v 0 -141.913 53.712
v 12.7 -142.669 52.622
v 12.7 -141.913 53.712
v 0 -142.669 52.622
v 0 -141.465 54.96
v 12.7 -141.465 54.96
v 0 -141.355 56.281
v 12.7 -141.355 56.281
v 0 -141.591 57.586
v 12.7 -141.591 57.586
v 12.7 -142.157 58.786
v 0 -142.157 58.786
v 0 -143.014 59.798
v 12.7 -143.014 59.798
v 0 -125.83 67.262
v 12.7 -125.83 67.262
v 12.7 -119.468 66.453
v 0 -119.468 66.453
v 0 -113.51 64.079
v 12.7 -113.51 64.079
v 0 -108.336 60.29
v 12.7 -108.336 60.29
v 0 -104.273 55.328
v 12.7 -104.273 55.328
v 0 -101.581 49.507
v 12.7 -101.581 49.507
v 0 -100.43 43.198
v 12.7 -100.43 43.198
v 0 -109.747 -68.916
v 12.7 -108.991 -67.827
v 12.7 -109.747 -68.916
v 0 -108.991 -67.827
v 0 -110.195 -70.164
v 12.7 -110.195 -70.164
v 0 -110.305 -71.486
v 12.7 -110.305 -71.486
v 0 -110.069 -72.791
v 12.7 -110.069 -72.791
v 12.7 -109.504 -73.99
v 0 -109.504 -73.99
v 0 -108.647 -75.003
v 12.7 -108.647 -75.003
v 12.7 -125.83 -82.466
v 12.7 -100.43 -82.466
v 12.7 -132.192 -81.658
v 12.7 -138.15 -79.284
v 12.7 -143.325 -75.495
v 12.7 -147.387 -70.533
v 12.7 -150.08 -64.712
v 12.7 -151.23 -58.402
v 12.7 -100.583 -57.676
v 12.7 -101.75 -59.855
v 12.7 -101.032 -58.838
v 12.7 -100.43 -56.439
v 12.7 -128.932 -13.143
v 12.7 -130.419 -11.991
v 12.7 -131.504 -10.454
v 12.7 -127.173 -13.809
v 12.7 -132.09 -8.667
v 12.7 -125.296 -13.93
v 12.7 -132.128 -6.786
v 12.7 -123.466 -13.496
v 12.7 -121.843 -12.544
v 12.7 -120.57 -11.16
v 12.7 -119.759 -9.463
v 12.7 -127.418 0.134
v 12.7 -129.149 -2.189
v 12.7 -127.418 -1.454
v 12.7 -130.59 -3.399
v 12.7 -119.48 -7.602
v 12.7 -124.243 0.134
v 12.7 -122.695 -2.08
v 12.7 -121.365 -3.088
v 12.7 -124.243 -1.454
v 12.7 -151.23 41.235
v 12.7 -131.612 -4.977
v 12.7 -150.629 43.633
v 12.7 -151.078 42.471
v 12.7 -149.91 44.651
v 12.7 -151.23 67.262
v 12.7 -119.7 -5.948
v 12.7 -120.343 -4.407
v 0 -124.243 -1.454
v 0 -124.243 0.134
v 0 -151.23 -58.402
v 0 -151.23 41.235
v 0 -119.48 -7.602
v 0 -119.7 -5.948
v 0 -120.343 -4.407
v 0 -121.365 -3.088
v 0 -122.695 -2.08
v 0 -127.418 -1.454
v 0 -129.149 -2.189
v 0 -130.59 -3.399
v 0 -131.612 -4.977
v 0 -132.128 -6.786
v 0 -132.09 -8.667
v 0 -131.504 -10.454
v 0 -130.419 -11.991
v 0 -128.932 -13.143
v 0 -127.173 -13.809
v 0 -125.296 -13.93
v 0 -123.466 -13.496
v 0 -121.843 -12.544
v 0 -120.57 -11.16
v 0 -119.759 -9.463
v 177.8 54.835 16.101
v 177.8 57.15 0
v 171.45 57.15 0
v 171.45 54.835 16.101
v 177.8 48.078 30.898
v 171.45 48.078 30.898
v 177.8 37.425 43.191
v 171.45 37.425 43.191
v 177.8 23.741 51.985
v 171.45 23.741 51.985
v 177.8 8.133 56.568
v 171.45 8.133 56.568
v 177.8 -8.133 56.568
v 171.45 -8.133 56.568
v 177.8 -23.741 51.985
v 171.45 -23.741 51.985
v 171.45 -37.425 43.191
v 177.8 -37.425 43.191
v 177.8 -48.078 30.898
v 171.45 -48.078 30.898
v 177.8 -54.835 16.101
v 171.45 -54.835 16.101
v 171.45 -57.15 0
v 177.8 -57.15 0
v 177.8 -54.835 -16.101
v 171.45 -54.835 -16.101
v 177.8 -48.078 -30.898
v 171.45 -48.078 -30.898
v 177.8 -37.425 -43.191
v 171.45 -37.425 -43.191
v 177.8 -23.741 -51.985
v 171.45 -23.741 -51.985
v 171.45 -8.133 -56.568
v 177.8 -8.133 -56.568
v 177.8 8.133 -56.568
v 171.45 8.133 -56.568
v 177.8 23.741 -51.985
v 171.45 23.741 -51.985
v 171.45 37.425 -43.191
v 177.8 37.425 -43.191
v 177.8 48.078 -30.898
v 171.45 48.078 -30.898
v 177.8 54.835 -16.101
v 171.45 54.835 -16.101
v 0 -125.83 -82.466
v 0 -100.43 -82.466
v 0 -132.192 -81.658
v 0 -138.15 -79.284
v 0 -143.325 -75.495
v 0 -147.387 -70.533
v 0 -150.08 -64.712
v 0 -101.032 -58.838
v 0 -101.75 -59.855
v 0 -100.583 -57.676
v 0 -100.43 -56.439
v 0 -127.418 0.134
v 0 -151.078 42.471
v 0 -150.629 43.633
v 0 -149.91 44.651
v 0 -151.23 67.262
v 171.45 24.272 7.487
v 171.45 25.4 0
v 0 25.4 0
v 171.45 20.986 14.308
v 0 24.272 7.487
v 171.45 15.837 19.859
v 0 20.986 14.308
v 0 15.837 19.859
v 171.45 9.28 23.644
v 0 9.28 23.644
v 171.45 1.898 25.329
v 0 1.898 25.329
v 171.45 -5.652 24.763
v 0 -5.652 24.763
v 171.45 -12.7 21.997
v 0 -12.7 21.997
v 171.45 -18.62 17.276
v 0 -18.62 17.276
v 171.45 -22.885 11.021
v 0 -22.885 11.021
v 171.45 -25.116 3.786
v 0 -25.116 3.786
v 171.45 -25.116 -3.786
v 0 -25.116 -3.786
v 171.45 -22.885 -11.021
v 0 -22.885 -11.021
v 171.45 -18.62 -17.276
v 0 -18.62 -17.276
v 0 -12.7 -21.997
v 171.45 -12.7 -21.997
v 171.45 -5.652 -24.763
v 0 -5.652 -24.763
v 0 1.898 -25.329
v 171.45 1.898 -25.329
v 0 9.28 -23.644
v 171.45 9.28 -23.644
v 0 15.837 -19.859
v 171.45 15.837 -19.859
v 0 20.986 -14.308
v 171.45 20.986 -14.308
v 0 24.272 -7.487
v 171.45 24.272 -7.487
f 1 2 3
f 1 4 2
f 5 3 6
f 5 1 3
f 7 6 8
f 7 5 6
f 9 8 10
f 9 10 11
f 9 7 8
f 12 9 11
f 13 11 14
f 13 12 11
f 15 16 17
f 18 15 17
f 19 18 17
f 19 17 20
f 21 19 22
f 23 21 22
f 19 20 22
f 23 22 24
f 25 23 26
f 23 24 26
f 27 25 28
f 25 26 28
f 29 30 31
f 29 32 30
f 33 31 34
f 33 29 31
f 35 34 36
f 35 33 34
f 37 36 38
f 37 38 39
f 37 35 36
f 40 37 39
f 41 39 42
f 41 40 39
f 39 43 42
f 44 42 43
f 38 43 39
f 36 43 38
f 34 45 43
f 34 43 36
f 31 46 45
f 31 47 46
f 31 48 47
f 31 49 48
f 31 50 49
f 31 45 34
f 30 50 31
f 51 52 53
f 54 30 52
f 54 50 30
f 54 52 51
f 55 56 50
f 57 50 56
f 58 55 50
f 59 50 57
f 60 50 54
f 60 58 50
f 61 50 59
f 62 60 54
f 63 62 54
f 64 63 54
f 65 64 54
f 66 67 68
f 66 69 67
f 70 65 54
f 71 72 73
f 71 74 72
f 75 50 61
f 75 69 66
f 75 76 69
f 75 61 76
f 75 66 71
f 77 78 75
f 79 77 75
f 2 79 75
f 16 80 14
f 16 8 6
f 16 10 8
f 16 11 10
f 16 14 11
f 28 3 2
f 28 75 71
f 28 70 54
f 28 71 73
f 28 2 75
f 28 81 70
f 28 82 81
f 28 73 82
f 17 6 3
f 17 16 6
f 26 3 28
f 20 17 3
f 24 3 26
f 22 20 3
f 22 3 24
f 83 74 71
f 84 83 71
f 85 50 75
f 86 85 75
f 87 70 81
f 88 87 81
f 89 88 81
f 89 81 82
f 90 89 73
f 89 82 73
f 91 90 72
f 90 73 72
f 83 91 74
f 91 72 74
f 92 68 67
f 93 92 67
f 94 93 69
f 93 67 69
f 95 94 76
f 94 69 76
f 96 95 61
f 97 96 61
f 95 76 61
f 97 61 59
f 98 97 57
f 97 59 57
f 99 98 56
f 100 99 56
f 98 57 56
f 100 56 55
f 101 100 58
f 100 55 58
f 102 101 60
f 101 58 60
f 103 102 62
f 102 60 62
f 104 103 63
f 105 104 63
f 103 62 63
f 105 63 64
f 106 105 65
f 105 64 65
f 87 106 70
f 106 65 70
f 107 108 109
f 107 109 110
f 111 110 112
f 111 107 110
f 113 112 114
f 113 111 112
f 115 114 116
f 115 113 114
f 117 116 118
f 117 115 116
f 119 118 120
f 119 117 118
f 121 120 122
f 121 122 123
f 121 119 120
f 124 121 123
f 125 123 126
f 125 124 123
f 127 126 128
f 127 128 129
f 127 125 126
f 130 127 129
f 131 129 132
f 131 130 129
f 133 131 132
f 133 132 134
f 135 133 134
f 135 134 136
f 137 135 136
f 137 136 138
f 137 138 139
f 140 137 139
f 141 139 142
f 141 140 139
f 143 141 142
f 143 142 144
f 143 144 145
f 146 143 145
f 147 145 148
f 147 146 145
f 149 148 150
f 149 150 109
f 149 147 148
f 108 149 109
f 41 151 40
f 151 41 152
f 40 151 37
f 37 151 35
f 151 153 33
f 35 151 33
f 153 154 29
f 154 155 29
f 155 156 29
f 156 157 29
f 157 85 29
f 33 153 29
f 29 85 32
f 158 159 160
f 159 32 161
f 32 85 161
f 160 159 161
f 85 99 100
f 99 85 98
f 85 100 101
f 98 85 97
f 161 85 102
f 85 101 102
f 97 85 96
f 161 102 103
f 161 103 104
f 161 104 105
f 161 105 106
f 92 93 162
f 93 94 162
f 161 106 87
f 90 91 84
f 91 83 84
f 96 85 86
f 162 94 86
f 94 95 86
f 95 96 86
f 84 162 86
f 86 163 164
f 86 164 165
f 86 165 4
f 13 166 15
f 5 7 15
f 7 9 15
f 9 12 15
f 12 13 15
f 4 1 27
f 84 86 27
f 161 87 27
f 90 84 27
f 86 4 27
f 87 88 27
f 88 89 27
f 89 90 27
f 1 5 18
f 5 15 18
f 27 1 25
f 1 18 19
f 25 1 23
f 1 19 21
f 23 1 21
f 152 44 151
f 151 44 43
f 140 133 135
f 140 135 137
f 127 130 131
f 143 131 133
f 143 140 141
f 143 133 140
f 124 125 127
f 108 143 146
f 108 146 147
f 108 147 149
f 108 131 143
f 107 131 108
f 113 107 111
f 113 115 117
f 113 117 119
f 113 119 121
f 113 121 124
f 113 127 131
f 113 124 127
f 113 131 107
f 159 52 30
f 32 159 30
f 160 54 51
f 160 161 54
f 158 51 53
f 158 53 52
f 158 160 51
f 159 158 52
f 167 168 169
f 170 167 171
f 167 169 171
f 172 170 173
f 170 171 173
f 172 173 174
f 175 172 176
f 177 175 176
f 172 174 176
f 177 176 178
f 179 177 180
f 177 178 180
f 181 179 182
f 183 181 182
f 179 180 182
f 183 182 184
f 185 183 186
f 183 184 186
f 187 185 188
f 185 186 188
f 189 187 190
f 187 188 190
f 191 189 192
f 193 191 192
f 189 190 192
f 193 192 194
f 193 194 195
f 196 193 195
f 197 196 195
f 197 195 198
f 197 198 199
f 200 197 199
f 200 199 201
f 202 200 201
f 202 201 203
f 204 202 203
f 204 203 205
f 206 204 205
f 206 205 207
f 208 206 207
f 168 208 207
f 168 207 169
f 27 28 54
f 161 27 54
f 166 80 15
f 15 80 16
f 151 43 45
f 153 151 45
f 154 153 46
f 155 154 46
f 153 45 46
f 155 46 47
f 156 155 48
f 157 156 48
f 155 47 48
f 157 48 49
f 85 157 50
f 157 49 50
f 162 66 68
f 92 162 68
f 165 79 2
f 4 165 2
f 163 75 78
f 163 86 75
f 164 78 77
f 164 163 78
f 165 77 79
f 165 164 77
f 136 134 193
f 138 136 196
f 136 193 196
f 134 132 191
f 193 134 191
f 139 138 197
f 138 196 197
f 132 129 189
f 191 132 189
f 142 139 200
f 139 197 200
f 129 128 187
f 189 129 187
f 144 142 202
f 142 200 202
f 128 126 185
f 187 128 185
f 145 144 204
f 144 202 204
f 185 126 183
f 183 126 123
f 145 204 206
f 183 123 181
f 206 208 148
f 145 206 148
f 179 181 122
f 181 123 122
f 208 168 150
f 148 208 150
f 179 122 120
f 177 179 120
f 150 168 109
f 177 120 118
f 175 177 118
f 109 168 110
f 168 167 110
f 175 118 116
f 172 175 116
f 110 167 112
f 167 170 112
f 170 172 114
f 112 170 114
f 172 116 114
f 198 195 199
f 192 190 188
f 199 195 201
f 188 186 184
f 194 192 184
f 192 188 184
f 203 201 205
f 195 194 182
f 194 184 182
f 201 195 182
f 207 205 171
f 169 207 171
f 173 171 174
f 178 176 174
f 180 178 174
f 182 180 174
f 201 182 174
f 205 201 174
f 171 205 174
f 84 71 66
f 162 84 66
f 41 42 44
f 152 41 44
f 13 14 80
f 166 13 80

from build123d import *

# Parameters (mm, degrees)
F0_R      = 25.4
F1_DEPTH  = 177.8
F2_R      = 57.15
F2_R_2    = 25.4
F3_DEPTH  = 6.35
F4_R      = 101.6
F5_DEPTH  = 12.7
F7_DEPTH  = 12.7
F9_R      = 101.6
F10_DEPTH = 12.7
F11_R     = 5.08


with BuildPart() as f1:
    # F0 (on Right) → F1 (new body)
    with BuildSketch(Plane.YZ):
        Circle(F0_R)
    extrude(amount=F1_DEPTH)

    # F2 (on face) → F3 (join)
    with BuildSketch(Plane.YZ.offset(177.8)):
        Circle(F2_R)
        Circle(F2_R_2, mode=Mode.SUBTRACT)
    extrude(amount=-F3_DEPTH)


with BuildPart() as f5:
    # F4 (on Right) → F5 (new body)
    with BuildSketch(Plane.YZ):
        with Locations((-125.8302330971, -7.6023228467)):
            Circle(F4_R)
    extrude(amount=F5_DEPTH)

    # F6 (on face) → F7 (cut, through all)
    with BuildSketch(Plane.YZ.offset(12.7)):
        with BuildLine():
            ThreePointArc((-127.4177330971, -1.4539617845), (-129.7187980637, -12.6224386322), (-119.4802330971, -7.6023228467))
            ThreePointArc((-119.4802330971, -7.6023228467), (-120.8101173116, -3.71375788), (-124.2427330971, -1.4539617845))
            ThreePointArc((-124.2427330971, -1.4539617845), (-125.8302330971, -1.2523228467), (-127.4177330971, -1.4539617845))
        make_face()
        with BuildLine():
            ThreePointArc((-127.4177330971, -1.4539617845), (-125.8302330971, -1.2523228467), (-124.2427330971, -1.4539617845))
            Line((-124.2427330971, -1.4539617845), (-124.2427330971, 0.1335382155))
            Line((-124.2427330971, 0.1335382155), (-127.4177330971, 0.1335382155))
            Line((-127.4177330971, 0.1335382155), (-127.4177330971, -1.4539617845))
        make_face()
    extrude(amount=-F7_DEPTH, mode=Mode.SUBTRACT)

    # F9 (on face) → F10 (cut, through all)
    with BuildSketch(Plane.YZ.offset(12.7)):
        with Locations((-125.8302330971, -7.6023228467)):
            Circle(F9_R)
        with BuildLine():
            ThreePointArc((-125.8302330971, 67.2617186885), (-108.3356761221, 60.2904333334), (-100.4302330971, 43.1976771533))
            Line((-100.4302330971, 43.1976771533), (-100.4302330971, -7.6023228467))
            Line((-100.4302330971, -7.6023228467), (-100.4302330971, -58.4023228467))
            Line((-100.4302330971, -58.4023228467), (-112.406924367, -71.586901629))
            Line((-112.406924367, -71.586901629), (-100.4302330971, -82.4663643818))
            Line((-100.4302330971, -82.4663643818), (-125.8302330971, -82.4663643818))
            ThreePointArc((-125.8302330971, -82.4663643818), (-143.3247900721, -75.4950790267), (-151.2302330971, -58.4023228467))
            Line((-151.2302330971, -58.4023228467), (-151.2302330971, -7.6023227028))
            Line((-151.2302330971, -7.6023227028), (-151.2302330971, 43.1976771533))
            Line((-151.2302330971, 43.1976771533), (-139.2535418272, 56.3822559357))
            Line((-139.2535418272, 56.3822559357), (-151.2302330971, 67.2617186885))
            Line((-151.2302330971, 67.2617186885), (-125.8302330971, 67.2617186885))
        make_face(mode=Mode.SUBTRACT)
    extrude(amount=-F10_DEPTH, mode=Mode.SUBTRACT)

    # F11
    f11_edges = [f5.edges().sort_by_distance(p)[0] for p in [
        (6.35, -151.230233, 43.197677),
        (6.35, -100.430233, -58.402323),
        (6.35, -112.406924, -71.586902),
        (6.35, -139.253542, 56.382256),
    ]]
    fillet(f11_edges, radius=F11_R)


solid = Compound([f1.part, f5.part])
